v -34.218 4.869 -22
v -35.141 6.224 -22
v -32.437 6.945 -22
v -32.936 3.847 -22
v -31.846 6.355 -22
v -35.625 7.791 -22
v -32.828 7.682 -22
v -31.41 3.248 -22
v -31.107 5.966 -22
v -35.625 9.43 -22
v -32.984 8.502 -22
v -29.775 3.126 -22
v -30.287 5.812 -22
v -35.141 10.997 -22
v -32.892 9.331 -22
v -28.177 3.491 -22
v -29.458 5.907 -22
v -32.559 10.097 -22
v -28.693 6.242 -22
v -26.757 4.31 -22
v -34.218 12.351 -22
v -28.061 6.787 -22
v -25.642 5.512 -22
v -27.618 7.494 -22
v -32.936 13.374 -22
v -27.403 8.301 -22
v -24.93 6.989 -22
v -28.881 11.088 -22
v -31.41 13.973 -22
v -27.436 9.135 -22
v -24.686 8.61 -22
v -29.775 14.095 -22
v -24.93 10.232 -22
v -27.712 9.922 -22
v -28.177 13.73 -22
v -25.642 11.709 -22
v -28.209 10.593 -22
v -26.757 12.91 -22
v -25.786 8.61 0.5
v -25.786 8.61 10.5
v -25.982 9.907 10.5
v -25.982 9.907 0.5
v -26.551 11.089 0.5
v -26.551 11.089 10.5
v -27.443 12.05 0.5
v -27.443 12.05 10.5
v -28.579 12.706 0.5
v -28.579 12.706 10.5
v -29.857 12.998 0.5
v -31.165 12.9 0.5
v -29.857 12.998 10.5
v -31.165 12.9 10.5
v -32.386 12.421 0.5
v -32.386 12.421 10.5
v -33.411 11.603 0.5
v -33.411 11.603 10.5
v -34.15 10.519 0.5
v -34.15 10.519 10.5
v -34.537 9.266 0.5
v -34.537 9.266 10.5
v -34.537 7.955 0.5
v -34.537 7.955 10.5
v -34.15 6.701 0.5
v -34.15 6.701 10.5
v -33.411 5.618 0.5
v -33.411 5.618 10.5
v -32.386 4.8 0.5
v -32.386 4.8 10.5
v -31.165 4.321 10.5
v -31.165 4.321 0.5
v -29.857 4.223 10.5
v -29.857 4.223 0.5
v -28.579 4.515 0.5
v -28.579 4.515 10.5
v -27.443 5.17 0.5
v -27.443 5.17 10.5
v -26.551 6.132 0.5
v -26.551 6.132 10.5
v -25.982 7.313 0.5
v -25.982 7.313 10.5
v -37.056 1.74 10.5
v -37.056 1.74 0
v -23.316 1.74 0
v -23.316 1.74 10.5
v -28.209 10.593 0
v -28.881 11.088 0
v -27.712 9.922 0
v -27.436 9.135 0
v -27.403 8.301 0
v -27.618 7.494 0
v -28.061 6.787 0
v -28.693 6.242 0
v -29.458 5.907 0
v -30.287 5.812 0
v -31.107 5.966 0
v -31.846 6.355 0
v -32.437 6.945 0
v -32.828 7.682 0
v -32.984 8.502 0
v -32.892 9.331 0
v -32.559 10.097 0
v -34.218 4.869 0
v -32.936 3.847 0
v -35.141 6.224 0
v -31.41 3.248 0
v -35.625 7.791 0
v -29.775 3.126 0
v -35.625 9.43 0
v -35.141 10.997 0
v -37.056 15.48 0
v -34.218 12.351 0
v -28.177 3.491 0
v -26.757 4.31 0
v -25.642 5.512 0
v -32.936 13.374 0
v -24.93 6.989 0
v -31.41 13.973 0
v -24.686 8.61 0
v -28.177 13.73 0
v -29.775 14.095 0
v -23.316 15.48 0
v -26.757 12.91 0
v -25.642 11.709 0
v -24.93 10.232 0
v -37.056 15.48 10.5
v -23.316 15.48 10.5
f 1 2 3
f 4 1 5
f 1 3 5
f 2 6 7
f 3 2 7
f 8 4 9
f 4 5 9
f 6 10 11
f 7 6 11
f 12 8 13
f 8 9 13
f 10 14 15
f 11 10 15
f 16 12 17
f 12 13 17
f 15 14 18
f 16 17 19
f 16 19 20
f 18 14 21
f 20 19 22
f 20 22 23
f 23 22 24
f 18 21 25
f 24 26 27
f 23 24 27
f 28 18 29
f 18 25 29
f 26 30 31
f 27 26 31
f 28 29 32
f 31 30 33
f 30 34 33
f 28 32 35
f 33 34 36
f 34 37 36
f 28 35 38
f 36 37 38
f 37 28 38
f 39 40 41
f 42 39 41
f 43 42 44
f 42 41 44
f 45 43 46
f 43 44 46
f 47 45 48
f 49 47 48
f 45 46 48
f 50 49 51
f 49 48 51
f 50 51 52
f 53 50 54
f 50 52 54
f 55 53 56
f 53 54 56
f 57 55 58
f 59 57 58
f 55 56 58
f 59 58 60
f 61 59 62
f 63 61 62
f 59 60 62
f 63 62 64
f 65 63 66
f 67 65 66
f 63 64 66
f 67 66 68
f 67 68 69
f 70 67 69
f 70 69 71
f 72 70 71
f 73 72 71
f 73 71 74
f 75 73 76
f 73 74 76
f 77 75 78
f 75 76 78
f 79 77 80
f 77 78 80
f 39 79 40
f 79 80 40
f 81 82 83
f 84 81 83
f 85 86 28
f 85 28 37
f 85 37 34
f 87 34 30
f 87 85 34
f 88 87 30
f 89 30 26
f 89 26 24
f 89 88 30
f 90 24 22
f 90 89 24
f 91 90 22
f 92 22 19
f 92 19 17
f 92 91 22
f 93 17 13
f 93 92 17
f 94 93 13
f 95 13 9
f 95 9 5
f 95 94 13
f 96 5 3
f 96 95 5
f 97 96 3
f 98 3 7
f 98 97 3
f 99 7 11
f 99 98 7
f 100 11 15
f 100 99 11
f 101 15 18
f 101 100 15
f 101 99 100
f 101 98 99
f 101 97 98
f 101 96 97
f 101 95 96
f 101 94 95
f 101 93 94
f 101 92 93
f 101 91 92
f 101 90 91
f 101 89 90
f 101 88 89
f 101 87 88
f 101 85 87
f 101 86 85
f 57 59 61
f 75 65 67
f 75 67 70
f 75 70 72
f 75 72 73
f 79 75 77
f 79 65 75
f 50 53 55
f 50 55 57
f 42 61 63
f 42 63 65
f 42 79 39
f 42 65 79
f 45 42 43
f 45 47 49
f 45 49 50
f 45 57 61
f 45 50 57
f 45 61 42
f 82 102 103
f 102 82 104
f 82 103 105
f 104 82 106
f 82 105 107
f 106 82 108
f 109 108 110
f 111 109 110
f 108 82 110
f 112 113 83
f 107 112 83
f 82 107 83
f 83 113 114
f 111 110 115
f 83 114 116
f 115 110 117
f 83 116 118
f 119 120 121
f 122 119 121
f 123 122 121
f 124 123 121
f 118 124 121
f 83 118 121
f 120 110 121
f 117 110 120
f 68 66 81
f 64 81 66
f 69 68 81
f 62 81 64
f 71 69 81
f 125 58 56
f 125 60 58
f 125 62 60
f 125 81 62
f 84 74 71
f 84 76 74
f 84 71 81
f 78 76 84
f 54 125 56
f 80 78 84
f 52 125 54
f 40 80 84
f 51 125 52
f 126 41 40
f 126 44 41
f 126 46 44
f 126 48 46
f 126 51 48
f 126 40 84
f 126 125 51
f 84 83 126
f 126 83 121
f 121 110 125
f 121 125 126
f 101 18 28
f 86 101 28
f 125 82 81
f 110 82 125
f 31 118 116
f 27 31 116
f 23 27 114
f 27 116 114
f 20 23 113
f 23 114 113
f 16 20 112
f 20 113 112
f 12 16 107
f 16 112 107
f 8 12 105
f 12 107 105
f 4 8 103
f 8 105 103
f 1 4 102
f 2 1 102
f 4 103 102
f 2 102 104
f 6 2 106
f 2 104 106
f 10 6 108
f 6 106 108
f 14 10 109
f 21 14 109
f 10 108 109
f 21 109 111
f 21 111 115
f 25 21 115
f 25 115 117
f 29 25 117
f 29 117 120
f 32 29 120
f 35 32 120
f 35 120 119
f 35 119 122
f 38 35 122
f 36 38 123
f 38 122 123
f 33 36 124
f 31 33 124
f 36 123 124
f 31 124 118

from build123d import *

# Parameters (mm, degrees)
ESQUISSE1_W             = 13.74
ESQUISSE1_H             = 13.74
BOSS_EXTRU_1_DEPTH      = 10.5
ESQUISSE3_R             = 4.4
ENL_V_MAT_EXTRU_2_DEPTH = 10
ESQUISSE8_R             = 5.5
BOSS_EXTRU_2_DEPTH      = 22
ESQUISSE2_R             = 2.8
ENL_V_MAT_EXTRU_3_DEPTH = 22
BOSS_EXTRU_3_DEPTH      = 22


with BuildPart() as part:
    # Esquisse1 → Boss.-Extru.1 (new body)
    with BuildSketch(Plane.XY):
        with Locations((-30.186071131, 8.6104)):
            Rectangle(ESQUISSE1_W, ESQUISSE1_H)
    extrude(amount=BOSS_EXTRU_1_DEPTH)

    # Esquisse3 → Enlèv. mat.-Extru.2 (cut)
    with BuildSketch(Plane.XY.offset(10.5)):
        with Locations((-30.186071131, 8.6104)):
            Circle(ESQUISSE3_R)
    extrude(amount=-ENL_V_MAT_EXTRU_2_DEPTH, mode=Mode.SUBTRACT)

    # Esquisse8 → Boss.-Extru.2 (add)
    with BuildSketch(Plane(origin=(0, 0, 0), x_dir=(-1, 0, 0), z_dir=(0, 0, -1))):
        with Locations(Location((30.186071131, 8.6104, 0), (0, 0, 180))):
            Circle(ESQUISSE8_R)
    extrude(amount=BOSS_EXTRU_2_DEPTH)

    # Esquisse2 → Enlèv. mat.-Extru.3 (cut)
    with BuildSketch(Plane(origin=(0, 0, 0), x_dir=(-1, 0, 0), z_dir=(0, 0, -1))):
        with Locations((30.186071131, 8.6104)):
            Circle(ESQUISSE2_R)
    extrude(amount=ENL_V_MAT_EXTRU_3_DEPTH, mode=Mode.SUBTRACT)

    # Esquisse9 → Boss.-Extru.3 (add)
    with BuildSketch(Plane(origin=(0, 0, -22), x_dir=(-1, 0, 0), z_dir=(0, 0, -1))):
        with BuildLine():
            Line((32.558926644, 10.096857773), (28.881418946, 11.087875061))
            ThreePointArc((28.881418946, 11.087875061), (30.919504526, 11.332054799), (32.558926644, 10.096857773))
        make_face()
    extrude(amount=-BOSS_EXTRU_3_DEPTH)


solid = part.part
